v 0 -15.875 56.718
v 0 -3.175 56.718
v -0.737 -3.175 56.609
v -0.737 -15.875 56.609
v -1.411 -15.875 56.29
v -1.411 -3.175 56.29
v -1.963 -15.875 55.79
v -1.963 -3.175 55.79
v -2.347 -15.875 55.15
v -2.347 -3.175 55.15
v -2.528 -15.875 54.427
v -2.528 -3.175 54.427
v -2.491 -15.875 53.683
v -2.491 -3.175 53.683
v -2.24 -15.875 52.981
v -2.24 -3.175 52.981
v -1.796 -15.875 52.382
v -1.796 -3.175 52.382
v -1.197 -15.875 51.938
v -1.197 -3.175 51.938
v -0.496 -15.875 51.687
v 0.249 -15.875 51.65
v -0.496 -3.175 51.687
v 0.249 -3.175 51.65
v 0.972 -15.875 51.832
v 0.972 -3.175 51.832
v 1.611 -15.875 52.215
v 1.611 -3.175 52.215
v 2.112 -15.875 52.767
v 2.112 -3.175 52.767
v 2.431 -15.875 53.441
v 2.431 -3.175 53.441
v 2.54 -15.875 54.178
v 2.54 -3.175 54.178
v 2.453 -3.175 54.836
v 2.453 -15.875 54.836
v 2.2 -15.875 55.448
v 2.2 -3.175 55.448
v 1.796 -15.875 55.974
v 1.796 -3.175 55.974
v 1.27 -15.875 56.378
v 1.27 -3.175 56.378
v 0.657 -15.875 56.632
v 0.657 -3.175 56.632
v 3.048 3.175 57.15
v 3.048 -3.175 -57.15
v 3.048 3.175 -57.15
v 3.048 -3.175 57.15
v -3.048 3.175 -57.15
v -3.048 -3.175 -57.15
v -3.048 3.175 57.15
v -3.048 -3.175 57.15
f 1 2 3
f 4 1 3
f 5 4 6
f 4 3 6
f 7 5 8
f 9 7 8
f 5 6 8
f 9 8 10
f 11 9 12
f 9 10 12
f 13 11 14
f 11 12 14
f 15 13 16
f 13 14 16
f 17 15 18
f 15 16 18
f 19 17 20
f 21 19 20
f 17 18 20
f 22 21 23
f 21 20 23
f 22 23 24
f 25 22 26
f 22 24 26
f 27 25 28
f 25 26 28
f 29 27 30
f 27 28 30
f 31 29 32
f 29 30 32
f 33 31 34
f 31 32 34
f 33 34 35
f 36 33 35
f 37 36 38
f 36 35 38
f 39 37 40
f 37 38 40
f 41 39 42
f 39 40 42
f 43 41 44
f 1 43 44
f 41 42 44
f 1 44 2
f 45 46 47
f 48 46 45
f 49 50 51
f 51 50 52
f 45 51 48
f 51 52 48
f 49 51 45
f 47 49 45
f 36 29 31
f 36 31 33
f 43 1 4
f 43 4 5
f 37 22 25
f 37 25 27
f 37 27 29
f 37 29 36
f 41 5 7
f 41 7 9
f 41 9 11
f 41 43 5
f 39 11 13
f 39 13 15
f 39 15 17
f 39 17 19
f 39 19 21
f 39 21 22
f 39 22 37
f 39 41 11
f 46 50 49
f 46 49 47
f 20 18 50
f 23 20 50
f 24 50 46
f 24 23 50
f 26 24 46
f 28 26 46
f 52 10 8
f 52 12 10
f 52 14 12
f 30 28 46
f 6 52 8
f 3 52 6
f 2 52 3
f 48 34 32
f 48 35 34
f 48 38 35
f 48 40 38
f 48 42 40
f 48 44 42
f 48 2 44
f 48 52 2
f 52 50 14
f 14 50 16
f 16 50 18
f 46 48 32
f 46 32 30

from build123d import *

# Parameters (mm, degrees)
F0_W     = 6.096
F0_H     = 114.3
F1_DEPTH = 3.175
F3_DEPTH = 12.7


with BuildPart() as f1:
    # F0 (on Front) → F1 (new body, symmetric)
    with BuildSketch(Plane.XZ):
        Rectangle(F0_W, F0_H)
    extrude(amount=F1_DEPTH, both=True)

    # F2 (on face) → F3 (join)
    with BuildSketch(Plane.XZ.offset(3.175)):
        with BuildLine():
            ThreePointArc((0, 56.7182), (-1.796051, 52.382149), (2.54, 54.1782))
            ThreePointArc((2.54, 54.1782), (1.796051, 55.974251), (0, 56.7182))
        make_face()
    extrude(amount=F3_DEPTH)


solid = f1.part
